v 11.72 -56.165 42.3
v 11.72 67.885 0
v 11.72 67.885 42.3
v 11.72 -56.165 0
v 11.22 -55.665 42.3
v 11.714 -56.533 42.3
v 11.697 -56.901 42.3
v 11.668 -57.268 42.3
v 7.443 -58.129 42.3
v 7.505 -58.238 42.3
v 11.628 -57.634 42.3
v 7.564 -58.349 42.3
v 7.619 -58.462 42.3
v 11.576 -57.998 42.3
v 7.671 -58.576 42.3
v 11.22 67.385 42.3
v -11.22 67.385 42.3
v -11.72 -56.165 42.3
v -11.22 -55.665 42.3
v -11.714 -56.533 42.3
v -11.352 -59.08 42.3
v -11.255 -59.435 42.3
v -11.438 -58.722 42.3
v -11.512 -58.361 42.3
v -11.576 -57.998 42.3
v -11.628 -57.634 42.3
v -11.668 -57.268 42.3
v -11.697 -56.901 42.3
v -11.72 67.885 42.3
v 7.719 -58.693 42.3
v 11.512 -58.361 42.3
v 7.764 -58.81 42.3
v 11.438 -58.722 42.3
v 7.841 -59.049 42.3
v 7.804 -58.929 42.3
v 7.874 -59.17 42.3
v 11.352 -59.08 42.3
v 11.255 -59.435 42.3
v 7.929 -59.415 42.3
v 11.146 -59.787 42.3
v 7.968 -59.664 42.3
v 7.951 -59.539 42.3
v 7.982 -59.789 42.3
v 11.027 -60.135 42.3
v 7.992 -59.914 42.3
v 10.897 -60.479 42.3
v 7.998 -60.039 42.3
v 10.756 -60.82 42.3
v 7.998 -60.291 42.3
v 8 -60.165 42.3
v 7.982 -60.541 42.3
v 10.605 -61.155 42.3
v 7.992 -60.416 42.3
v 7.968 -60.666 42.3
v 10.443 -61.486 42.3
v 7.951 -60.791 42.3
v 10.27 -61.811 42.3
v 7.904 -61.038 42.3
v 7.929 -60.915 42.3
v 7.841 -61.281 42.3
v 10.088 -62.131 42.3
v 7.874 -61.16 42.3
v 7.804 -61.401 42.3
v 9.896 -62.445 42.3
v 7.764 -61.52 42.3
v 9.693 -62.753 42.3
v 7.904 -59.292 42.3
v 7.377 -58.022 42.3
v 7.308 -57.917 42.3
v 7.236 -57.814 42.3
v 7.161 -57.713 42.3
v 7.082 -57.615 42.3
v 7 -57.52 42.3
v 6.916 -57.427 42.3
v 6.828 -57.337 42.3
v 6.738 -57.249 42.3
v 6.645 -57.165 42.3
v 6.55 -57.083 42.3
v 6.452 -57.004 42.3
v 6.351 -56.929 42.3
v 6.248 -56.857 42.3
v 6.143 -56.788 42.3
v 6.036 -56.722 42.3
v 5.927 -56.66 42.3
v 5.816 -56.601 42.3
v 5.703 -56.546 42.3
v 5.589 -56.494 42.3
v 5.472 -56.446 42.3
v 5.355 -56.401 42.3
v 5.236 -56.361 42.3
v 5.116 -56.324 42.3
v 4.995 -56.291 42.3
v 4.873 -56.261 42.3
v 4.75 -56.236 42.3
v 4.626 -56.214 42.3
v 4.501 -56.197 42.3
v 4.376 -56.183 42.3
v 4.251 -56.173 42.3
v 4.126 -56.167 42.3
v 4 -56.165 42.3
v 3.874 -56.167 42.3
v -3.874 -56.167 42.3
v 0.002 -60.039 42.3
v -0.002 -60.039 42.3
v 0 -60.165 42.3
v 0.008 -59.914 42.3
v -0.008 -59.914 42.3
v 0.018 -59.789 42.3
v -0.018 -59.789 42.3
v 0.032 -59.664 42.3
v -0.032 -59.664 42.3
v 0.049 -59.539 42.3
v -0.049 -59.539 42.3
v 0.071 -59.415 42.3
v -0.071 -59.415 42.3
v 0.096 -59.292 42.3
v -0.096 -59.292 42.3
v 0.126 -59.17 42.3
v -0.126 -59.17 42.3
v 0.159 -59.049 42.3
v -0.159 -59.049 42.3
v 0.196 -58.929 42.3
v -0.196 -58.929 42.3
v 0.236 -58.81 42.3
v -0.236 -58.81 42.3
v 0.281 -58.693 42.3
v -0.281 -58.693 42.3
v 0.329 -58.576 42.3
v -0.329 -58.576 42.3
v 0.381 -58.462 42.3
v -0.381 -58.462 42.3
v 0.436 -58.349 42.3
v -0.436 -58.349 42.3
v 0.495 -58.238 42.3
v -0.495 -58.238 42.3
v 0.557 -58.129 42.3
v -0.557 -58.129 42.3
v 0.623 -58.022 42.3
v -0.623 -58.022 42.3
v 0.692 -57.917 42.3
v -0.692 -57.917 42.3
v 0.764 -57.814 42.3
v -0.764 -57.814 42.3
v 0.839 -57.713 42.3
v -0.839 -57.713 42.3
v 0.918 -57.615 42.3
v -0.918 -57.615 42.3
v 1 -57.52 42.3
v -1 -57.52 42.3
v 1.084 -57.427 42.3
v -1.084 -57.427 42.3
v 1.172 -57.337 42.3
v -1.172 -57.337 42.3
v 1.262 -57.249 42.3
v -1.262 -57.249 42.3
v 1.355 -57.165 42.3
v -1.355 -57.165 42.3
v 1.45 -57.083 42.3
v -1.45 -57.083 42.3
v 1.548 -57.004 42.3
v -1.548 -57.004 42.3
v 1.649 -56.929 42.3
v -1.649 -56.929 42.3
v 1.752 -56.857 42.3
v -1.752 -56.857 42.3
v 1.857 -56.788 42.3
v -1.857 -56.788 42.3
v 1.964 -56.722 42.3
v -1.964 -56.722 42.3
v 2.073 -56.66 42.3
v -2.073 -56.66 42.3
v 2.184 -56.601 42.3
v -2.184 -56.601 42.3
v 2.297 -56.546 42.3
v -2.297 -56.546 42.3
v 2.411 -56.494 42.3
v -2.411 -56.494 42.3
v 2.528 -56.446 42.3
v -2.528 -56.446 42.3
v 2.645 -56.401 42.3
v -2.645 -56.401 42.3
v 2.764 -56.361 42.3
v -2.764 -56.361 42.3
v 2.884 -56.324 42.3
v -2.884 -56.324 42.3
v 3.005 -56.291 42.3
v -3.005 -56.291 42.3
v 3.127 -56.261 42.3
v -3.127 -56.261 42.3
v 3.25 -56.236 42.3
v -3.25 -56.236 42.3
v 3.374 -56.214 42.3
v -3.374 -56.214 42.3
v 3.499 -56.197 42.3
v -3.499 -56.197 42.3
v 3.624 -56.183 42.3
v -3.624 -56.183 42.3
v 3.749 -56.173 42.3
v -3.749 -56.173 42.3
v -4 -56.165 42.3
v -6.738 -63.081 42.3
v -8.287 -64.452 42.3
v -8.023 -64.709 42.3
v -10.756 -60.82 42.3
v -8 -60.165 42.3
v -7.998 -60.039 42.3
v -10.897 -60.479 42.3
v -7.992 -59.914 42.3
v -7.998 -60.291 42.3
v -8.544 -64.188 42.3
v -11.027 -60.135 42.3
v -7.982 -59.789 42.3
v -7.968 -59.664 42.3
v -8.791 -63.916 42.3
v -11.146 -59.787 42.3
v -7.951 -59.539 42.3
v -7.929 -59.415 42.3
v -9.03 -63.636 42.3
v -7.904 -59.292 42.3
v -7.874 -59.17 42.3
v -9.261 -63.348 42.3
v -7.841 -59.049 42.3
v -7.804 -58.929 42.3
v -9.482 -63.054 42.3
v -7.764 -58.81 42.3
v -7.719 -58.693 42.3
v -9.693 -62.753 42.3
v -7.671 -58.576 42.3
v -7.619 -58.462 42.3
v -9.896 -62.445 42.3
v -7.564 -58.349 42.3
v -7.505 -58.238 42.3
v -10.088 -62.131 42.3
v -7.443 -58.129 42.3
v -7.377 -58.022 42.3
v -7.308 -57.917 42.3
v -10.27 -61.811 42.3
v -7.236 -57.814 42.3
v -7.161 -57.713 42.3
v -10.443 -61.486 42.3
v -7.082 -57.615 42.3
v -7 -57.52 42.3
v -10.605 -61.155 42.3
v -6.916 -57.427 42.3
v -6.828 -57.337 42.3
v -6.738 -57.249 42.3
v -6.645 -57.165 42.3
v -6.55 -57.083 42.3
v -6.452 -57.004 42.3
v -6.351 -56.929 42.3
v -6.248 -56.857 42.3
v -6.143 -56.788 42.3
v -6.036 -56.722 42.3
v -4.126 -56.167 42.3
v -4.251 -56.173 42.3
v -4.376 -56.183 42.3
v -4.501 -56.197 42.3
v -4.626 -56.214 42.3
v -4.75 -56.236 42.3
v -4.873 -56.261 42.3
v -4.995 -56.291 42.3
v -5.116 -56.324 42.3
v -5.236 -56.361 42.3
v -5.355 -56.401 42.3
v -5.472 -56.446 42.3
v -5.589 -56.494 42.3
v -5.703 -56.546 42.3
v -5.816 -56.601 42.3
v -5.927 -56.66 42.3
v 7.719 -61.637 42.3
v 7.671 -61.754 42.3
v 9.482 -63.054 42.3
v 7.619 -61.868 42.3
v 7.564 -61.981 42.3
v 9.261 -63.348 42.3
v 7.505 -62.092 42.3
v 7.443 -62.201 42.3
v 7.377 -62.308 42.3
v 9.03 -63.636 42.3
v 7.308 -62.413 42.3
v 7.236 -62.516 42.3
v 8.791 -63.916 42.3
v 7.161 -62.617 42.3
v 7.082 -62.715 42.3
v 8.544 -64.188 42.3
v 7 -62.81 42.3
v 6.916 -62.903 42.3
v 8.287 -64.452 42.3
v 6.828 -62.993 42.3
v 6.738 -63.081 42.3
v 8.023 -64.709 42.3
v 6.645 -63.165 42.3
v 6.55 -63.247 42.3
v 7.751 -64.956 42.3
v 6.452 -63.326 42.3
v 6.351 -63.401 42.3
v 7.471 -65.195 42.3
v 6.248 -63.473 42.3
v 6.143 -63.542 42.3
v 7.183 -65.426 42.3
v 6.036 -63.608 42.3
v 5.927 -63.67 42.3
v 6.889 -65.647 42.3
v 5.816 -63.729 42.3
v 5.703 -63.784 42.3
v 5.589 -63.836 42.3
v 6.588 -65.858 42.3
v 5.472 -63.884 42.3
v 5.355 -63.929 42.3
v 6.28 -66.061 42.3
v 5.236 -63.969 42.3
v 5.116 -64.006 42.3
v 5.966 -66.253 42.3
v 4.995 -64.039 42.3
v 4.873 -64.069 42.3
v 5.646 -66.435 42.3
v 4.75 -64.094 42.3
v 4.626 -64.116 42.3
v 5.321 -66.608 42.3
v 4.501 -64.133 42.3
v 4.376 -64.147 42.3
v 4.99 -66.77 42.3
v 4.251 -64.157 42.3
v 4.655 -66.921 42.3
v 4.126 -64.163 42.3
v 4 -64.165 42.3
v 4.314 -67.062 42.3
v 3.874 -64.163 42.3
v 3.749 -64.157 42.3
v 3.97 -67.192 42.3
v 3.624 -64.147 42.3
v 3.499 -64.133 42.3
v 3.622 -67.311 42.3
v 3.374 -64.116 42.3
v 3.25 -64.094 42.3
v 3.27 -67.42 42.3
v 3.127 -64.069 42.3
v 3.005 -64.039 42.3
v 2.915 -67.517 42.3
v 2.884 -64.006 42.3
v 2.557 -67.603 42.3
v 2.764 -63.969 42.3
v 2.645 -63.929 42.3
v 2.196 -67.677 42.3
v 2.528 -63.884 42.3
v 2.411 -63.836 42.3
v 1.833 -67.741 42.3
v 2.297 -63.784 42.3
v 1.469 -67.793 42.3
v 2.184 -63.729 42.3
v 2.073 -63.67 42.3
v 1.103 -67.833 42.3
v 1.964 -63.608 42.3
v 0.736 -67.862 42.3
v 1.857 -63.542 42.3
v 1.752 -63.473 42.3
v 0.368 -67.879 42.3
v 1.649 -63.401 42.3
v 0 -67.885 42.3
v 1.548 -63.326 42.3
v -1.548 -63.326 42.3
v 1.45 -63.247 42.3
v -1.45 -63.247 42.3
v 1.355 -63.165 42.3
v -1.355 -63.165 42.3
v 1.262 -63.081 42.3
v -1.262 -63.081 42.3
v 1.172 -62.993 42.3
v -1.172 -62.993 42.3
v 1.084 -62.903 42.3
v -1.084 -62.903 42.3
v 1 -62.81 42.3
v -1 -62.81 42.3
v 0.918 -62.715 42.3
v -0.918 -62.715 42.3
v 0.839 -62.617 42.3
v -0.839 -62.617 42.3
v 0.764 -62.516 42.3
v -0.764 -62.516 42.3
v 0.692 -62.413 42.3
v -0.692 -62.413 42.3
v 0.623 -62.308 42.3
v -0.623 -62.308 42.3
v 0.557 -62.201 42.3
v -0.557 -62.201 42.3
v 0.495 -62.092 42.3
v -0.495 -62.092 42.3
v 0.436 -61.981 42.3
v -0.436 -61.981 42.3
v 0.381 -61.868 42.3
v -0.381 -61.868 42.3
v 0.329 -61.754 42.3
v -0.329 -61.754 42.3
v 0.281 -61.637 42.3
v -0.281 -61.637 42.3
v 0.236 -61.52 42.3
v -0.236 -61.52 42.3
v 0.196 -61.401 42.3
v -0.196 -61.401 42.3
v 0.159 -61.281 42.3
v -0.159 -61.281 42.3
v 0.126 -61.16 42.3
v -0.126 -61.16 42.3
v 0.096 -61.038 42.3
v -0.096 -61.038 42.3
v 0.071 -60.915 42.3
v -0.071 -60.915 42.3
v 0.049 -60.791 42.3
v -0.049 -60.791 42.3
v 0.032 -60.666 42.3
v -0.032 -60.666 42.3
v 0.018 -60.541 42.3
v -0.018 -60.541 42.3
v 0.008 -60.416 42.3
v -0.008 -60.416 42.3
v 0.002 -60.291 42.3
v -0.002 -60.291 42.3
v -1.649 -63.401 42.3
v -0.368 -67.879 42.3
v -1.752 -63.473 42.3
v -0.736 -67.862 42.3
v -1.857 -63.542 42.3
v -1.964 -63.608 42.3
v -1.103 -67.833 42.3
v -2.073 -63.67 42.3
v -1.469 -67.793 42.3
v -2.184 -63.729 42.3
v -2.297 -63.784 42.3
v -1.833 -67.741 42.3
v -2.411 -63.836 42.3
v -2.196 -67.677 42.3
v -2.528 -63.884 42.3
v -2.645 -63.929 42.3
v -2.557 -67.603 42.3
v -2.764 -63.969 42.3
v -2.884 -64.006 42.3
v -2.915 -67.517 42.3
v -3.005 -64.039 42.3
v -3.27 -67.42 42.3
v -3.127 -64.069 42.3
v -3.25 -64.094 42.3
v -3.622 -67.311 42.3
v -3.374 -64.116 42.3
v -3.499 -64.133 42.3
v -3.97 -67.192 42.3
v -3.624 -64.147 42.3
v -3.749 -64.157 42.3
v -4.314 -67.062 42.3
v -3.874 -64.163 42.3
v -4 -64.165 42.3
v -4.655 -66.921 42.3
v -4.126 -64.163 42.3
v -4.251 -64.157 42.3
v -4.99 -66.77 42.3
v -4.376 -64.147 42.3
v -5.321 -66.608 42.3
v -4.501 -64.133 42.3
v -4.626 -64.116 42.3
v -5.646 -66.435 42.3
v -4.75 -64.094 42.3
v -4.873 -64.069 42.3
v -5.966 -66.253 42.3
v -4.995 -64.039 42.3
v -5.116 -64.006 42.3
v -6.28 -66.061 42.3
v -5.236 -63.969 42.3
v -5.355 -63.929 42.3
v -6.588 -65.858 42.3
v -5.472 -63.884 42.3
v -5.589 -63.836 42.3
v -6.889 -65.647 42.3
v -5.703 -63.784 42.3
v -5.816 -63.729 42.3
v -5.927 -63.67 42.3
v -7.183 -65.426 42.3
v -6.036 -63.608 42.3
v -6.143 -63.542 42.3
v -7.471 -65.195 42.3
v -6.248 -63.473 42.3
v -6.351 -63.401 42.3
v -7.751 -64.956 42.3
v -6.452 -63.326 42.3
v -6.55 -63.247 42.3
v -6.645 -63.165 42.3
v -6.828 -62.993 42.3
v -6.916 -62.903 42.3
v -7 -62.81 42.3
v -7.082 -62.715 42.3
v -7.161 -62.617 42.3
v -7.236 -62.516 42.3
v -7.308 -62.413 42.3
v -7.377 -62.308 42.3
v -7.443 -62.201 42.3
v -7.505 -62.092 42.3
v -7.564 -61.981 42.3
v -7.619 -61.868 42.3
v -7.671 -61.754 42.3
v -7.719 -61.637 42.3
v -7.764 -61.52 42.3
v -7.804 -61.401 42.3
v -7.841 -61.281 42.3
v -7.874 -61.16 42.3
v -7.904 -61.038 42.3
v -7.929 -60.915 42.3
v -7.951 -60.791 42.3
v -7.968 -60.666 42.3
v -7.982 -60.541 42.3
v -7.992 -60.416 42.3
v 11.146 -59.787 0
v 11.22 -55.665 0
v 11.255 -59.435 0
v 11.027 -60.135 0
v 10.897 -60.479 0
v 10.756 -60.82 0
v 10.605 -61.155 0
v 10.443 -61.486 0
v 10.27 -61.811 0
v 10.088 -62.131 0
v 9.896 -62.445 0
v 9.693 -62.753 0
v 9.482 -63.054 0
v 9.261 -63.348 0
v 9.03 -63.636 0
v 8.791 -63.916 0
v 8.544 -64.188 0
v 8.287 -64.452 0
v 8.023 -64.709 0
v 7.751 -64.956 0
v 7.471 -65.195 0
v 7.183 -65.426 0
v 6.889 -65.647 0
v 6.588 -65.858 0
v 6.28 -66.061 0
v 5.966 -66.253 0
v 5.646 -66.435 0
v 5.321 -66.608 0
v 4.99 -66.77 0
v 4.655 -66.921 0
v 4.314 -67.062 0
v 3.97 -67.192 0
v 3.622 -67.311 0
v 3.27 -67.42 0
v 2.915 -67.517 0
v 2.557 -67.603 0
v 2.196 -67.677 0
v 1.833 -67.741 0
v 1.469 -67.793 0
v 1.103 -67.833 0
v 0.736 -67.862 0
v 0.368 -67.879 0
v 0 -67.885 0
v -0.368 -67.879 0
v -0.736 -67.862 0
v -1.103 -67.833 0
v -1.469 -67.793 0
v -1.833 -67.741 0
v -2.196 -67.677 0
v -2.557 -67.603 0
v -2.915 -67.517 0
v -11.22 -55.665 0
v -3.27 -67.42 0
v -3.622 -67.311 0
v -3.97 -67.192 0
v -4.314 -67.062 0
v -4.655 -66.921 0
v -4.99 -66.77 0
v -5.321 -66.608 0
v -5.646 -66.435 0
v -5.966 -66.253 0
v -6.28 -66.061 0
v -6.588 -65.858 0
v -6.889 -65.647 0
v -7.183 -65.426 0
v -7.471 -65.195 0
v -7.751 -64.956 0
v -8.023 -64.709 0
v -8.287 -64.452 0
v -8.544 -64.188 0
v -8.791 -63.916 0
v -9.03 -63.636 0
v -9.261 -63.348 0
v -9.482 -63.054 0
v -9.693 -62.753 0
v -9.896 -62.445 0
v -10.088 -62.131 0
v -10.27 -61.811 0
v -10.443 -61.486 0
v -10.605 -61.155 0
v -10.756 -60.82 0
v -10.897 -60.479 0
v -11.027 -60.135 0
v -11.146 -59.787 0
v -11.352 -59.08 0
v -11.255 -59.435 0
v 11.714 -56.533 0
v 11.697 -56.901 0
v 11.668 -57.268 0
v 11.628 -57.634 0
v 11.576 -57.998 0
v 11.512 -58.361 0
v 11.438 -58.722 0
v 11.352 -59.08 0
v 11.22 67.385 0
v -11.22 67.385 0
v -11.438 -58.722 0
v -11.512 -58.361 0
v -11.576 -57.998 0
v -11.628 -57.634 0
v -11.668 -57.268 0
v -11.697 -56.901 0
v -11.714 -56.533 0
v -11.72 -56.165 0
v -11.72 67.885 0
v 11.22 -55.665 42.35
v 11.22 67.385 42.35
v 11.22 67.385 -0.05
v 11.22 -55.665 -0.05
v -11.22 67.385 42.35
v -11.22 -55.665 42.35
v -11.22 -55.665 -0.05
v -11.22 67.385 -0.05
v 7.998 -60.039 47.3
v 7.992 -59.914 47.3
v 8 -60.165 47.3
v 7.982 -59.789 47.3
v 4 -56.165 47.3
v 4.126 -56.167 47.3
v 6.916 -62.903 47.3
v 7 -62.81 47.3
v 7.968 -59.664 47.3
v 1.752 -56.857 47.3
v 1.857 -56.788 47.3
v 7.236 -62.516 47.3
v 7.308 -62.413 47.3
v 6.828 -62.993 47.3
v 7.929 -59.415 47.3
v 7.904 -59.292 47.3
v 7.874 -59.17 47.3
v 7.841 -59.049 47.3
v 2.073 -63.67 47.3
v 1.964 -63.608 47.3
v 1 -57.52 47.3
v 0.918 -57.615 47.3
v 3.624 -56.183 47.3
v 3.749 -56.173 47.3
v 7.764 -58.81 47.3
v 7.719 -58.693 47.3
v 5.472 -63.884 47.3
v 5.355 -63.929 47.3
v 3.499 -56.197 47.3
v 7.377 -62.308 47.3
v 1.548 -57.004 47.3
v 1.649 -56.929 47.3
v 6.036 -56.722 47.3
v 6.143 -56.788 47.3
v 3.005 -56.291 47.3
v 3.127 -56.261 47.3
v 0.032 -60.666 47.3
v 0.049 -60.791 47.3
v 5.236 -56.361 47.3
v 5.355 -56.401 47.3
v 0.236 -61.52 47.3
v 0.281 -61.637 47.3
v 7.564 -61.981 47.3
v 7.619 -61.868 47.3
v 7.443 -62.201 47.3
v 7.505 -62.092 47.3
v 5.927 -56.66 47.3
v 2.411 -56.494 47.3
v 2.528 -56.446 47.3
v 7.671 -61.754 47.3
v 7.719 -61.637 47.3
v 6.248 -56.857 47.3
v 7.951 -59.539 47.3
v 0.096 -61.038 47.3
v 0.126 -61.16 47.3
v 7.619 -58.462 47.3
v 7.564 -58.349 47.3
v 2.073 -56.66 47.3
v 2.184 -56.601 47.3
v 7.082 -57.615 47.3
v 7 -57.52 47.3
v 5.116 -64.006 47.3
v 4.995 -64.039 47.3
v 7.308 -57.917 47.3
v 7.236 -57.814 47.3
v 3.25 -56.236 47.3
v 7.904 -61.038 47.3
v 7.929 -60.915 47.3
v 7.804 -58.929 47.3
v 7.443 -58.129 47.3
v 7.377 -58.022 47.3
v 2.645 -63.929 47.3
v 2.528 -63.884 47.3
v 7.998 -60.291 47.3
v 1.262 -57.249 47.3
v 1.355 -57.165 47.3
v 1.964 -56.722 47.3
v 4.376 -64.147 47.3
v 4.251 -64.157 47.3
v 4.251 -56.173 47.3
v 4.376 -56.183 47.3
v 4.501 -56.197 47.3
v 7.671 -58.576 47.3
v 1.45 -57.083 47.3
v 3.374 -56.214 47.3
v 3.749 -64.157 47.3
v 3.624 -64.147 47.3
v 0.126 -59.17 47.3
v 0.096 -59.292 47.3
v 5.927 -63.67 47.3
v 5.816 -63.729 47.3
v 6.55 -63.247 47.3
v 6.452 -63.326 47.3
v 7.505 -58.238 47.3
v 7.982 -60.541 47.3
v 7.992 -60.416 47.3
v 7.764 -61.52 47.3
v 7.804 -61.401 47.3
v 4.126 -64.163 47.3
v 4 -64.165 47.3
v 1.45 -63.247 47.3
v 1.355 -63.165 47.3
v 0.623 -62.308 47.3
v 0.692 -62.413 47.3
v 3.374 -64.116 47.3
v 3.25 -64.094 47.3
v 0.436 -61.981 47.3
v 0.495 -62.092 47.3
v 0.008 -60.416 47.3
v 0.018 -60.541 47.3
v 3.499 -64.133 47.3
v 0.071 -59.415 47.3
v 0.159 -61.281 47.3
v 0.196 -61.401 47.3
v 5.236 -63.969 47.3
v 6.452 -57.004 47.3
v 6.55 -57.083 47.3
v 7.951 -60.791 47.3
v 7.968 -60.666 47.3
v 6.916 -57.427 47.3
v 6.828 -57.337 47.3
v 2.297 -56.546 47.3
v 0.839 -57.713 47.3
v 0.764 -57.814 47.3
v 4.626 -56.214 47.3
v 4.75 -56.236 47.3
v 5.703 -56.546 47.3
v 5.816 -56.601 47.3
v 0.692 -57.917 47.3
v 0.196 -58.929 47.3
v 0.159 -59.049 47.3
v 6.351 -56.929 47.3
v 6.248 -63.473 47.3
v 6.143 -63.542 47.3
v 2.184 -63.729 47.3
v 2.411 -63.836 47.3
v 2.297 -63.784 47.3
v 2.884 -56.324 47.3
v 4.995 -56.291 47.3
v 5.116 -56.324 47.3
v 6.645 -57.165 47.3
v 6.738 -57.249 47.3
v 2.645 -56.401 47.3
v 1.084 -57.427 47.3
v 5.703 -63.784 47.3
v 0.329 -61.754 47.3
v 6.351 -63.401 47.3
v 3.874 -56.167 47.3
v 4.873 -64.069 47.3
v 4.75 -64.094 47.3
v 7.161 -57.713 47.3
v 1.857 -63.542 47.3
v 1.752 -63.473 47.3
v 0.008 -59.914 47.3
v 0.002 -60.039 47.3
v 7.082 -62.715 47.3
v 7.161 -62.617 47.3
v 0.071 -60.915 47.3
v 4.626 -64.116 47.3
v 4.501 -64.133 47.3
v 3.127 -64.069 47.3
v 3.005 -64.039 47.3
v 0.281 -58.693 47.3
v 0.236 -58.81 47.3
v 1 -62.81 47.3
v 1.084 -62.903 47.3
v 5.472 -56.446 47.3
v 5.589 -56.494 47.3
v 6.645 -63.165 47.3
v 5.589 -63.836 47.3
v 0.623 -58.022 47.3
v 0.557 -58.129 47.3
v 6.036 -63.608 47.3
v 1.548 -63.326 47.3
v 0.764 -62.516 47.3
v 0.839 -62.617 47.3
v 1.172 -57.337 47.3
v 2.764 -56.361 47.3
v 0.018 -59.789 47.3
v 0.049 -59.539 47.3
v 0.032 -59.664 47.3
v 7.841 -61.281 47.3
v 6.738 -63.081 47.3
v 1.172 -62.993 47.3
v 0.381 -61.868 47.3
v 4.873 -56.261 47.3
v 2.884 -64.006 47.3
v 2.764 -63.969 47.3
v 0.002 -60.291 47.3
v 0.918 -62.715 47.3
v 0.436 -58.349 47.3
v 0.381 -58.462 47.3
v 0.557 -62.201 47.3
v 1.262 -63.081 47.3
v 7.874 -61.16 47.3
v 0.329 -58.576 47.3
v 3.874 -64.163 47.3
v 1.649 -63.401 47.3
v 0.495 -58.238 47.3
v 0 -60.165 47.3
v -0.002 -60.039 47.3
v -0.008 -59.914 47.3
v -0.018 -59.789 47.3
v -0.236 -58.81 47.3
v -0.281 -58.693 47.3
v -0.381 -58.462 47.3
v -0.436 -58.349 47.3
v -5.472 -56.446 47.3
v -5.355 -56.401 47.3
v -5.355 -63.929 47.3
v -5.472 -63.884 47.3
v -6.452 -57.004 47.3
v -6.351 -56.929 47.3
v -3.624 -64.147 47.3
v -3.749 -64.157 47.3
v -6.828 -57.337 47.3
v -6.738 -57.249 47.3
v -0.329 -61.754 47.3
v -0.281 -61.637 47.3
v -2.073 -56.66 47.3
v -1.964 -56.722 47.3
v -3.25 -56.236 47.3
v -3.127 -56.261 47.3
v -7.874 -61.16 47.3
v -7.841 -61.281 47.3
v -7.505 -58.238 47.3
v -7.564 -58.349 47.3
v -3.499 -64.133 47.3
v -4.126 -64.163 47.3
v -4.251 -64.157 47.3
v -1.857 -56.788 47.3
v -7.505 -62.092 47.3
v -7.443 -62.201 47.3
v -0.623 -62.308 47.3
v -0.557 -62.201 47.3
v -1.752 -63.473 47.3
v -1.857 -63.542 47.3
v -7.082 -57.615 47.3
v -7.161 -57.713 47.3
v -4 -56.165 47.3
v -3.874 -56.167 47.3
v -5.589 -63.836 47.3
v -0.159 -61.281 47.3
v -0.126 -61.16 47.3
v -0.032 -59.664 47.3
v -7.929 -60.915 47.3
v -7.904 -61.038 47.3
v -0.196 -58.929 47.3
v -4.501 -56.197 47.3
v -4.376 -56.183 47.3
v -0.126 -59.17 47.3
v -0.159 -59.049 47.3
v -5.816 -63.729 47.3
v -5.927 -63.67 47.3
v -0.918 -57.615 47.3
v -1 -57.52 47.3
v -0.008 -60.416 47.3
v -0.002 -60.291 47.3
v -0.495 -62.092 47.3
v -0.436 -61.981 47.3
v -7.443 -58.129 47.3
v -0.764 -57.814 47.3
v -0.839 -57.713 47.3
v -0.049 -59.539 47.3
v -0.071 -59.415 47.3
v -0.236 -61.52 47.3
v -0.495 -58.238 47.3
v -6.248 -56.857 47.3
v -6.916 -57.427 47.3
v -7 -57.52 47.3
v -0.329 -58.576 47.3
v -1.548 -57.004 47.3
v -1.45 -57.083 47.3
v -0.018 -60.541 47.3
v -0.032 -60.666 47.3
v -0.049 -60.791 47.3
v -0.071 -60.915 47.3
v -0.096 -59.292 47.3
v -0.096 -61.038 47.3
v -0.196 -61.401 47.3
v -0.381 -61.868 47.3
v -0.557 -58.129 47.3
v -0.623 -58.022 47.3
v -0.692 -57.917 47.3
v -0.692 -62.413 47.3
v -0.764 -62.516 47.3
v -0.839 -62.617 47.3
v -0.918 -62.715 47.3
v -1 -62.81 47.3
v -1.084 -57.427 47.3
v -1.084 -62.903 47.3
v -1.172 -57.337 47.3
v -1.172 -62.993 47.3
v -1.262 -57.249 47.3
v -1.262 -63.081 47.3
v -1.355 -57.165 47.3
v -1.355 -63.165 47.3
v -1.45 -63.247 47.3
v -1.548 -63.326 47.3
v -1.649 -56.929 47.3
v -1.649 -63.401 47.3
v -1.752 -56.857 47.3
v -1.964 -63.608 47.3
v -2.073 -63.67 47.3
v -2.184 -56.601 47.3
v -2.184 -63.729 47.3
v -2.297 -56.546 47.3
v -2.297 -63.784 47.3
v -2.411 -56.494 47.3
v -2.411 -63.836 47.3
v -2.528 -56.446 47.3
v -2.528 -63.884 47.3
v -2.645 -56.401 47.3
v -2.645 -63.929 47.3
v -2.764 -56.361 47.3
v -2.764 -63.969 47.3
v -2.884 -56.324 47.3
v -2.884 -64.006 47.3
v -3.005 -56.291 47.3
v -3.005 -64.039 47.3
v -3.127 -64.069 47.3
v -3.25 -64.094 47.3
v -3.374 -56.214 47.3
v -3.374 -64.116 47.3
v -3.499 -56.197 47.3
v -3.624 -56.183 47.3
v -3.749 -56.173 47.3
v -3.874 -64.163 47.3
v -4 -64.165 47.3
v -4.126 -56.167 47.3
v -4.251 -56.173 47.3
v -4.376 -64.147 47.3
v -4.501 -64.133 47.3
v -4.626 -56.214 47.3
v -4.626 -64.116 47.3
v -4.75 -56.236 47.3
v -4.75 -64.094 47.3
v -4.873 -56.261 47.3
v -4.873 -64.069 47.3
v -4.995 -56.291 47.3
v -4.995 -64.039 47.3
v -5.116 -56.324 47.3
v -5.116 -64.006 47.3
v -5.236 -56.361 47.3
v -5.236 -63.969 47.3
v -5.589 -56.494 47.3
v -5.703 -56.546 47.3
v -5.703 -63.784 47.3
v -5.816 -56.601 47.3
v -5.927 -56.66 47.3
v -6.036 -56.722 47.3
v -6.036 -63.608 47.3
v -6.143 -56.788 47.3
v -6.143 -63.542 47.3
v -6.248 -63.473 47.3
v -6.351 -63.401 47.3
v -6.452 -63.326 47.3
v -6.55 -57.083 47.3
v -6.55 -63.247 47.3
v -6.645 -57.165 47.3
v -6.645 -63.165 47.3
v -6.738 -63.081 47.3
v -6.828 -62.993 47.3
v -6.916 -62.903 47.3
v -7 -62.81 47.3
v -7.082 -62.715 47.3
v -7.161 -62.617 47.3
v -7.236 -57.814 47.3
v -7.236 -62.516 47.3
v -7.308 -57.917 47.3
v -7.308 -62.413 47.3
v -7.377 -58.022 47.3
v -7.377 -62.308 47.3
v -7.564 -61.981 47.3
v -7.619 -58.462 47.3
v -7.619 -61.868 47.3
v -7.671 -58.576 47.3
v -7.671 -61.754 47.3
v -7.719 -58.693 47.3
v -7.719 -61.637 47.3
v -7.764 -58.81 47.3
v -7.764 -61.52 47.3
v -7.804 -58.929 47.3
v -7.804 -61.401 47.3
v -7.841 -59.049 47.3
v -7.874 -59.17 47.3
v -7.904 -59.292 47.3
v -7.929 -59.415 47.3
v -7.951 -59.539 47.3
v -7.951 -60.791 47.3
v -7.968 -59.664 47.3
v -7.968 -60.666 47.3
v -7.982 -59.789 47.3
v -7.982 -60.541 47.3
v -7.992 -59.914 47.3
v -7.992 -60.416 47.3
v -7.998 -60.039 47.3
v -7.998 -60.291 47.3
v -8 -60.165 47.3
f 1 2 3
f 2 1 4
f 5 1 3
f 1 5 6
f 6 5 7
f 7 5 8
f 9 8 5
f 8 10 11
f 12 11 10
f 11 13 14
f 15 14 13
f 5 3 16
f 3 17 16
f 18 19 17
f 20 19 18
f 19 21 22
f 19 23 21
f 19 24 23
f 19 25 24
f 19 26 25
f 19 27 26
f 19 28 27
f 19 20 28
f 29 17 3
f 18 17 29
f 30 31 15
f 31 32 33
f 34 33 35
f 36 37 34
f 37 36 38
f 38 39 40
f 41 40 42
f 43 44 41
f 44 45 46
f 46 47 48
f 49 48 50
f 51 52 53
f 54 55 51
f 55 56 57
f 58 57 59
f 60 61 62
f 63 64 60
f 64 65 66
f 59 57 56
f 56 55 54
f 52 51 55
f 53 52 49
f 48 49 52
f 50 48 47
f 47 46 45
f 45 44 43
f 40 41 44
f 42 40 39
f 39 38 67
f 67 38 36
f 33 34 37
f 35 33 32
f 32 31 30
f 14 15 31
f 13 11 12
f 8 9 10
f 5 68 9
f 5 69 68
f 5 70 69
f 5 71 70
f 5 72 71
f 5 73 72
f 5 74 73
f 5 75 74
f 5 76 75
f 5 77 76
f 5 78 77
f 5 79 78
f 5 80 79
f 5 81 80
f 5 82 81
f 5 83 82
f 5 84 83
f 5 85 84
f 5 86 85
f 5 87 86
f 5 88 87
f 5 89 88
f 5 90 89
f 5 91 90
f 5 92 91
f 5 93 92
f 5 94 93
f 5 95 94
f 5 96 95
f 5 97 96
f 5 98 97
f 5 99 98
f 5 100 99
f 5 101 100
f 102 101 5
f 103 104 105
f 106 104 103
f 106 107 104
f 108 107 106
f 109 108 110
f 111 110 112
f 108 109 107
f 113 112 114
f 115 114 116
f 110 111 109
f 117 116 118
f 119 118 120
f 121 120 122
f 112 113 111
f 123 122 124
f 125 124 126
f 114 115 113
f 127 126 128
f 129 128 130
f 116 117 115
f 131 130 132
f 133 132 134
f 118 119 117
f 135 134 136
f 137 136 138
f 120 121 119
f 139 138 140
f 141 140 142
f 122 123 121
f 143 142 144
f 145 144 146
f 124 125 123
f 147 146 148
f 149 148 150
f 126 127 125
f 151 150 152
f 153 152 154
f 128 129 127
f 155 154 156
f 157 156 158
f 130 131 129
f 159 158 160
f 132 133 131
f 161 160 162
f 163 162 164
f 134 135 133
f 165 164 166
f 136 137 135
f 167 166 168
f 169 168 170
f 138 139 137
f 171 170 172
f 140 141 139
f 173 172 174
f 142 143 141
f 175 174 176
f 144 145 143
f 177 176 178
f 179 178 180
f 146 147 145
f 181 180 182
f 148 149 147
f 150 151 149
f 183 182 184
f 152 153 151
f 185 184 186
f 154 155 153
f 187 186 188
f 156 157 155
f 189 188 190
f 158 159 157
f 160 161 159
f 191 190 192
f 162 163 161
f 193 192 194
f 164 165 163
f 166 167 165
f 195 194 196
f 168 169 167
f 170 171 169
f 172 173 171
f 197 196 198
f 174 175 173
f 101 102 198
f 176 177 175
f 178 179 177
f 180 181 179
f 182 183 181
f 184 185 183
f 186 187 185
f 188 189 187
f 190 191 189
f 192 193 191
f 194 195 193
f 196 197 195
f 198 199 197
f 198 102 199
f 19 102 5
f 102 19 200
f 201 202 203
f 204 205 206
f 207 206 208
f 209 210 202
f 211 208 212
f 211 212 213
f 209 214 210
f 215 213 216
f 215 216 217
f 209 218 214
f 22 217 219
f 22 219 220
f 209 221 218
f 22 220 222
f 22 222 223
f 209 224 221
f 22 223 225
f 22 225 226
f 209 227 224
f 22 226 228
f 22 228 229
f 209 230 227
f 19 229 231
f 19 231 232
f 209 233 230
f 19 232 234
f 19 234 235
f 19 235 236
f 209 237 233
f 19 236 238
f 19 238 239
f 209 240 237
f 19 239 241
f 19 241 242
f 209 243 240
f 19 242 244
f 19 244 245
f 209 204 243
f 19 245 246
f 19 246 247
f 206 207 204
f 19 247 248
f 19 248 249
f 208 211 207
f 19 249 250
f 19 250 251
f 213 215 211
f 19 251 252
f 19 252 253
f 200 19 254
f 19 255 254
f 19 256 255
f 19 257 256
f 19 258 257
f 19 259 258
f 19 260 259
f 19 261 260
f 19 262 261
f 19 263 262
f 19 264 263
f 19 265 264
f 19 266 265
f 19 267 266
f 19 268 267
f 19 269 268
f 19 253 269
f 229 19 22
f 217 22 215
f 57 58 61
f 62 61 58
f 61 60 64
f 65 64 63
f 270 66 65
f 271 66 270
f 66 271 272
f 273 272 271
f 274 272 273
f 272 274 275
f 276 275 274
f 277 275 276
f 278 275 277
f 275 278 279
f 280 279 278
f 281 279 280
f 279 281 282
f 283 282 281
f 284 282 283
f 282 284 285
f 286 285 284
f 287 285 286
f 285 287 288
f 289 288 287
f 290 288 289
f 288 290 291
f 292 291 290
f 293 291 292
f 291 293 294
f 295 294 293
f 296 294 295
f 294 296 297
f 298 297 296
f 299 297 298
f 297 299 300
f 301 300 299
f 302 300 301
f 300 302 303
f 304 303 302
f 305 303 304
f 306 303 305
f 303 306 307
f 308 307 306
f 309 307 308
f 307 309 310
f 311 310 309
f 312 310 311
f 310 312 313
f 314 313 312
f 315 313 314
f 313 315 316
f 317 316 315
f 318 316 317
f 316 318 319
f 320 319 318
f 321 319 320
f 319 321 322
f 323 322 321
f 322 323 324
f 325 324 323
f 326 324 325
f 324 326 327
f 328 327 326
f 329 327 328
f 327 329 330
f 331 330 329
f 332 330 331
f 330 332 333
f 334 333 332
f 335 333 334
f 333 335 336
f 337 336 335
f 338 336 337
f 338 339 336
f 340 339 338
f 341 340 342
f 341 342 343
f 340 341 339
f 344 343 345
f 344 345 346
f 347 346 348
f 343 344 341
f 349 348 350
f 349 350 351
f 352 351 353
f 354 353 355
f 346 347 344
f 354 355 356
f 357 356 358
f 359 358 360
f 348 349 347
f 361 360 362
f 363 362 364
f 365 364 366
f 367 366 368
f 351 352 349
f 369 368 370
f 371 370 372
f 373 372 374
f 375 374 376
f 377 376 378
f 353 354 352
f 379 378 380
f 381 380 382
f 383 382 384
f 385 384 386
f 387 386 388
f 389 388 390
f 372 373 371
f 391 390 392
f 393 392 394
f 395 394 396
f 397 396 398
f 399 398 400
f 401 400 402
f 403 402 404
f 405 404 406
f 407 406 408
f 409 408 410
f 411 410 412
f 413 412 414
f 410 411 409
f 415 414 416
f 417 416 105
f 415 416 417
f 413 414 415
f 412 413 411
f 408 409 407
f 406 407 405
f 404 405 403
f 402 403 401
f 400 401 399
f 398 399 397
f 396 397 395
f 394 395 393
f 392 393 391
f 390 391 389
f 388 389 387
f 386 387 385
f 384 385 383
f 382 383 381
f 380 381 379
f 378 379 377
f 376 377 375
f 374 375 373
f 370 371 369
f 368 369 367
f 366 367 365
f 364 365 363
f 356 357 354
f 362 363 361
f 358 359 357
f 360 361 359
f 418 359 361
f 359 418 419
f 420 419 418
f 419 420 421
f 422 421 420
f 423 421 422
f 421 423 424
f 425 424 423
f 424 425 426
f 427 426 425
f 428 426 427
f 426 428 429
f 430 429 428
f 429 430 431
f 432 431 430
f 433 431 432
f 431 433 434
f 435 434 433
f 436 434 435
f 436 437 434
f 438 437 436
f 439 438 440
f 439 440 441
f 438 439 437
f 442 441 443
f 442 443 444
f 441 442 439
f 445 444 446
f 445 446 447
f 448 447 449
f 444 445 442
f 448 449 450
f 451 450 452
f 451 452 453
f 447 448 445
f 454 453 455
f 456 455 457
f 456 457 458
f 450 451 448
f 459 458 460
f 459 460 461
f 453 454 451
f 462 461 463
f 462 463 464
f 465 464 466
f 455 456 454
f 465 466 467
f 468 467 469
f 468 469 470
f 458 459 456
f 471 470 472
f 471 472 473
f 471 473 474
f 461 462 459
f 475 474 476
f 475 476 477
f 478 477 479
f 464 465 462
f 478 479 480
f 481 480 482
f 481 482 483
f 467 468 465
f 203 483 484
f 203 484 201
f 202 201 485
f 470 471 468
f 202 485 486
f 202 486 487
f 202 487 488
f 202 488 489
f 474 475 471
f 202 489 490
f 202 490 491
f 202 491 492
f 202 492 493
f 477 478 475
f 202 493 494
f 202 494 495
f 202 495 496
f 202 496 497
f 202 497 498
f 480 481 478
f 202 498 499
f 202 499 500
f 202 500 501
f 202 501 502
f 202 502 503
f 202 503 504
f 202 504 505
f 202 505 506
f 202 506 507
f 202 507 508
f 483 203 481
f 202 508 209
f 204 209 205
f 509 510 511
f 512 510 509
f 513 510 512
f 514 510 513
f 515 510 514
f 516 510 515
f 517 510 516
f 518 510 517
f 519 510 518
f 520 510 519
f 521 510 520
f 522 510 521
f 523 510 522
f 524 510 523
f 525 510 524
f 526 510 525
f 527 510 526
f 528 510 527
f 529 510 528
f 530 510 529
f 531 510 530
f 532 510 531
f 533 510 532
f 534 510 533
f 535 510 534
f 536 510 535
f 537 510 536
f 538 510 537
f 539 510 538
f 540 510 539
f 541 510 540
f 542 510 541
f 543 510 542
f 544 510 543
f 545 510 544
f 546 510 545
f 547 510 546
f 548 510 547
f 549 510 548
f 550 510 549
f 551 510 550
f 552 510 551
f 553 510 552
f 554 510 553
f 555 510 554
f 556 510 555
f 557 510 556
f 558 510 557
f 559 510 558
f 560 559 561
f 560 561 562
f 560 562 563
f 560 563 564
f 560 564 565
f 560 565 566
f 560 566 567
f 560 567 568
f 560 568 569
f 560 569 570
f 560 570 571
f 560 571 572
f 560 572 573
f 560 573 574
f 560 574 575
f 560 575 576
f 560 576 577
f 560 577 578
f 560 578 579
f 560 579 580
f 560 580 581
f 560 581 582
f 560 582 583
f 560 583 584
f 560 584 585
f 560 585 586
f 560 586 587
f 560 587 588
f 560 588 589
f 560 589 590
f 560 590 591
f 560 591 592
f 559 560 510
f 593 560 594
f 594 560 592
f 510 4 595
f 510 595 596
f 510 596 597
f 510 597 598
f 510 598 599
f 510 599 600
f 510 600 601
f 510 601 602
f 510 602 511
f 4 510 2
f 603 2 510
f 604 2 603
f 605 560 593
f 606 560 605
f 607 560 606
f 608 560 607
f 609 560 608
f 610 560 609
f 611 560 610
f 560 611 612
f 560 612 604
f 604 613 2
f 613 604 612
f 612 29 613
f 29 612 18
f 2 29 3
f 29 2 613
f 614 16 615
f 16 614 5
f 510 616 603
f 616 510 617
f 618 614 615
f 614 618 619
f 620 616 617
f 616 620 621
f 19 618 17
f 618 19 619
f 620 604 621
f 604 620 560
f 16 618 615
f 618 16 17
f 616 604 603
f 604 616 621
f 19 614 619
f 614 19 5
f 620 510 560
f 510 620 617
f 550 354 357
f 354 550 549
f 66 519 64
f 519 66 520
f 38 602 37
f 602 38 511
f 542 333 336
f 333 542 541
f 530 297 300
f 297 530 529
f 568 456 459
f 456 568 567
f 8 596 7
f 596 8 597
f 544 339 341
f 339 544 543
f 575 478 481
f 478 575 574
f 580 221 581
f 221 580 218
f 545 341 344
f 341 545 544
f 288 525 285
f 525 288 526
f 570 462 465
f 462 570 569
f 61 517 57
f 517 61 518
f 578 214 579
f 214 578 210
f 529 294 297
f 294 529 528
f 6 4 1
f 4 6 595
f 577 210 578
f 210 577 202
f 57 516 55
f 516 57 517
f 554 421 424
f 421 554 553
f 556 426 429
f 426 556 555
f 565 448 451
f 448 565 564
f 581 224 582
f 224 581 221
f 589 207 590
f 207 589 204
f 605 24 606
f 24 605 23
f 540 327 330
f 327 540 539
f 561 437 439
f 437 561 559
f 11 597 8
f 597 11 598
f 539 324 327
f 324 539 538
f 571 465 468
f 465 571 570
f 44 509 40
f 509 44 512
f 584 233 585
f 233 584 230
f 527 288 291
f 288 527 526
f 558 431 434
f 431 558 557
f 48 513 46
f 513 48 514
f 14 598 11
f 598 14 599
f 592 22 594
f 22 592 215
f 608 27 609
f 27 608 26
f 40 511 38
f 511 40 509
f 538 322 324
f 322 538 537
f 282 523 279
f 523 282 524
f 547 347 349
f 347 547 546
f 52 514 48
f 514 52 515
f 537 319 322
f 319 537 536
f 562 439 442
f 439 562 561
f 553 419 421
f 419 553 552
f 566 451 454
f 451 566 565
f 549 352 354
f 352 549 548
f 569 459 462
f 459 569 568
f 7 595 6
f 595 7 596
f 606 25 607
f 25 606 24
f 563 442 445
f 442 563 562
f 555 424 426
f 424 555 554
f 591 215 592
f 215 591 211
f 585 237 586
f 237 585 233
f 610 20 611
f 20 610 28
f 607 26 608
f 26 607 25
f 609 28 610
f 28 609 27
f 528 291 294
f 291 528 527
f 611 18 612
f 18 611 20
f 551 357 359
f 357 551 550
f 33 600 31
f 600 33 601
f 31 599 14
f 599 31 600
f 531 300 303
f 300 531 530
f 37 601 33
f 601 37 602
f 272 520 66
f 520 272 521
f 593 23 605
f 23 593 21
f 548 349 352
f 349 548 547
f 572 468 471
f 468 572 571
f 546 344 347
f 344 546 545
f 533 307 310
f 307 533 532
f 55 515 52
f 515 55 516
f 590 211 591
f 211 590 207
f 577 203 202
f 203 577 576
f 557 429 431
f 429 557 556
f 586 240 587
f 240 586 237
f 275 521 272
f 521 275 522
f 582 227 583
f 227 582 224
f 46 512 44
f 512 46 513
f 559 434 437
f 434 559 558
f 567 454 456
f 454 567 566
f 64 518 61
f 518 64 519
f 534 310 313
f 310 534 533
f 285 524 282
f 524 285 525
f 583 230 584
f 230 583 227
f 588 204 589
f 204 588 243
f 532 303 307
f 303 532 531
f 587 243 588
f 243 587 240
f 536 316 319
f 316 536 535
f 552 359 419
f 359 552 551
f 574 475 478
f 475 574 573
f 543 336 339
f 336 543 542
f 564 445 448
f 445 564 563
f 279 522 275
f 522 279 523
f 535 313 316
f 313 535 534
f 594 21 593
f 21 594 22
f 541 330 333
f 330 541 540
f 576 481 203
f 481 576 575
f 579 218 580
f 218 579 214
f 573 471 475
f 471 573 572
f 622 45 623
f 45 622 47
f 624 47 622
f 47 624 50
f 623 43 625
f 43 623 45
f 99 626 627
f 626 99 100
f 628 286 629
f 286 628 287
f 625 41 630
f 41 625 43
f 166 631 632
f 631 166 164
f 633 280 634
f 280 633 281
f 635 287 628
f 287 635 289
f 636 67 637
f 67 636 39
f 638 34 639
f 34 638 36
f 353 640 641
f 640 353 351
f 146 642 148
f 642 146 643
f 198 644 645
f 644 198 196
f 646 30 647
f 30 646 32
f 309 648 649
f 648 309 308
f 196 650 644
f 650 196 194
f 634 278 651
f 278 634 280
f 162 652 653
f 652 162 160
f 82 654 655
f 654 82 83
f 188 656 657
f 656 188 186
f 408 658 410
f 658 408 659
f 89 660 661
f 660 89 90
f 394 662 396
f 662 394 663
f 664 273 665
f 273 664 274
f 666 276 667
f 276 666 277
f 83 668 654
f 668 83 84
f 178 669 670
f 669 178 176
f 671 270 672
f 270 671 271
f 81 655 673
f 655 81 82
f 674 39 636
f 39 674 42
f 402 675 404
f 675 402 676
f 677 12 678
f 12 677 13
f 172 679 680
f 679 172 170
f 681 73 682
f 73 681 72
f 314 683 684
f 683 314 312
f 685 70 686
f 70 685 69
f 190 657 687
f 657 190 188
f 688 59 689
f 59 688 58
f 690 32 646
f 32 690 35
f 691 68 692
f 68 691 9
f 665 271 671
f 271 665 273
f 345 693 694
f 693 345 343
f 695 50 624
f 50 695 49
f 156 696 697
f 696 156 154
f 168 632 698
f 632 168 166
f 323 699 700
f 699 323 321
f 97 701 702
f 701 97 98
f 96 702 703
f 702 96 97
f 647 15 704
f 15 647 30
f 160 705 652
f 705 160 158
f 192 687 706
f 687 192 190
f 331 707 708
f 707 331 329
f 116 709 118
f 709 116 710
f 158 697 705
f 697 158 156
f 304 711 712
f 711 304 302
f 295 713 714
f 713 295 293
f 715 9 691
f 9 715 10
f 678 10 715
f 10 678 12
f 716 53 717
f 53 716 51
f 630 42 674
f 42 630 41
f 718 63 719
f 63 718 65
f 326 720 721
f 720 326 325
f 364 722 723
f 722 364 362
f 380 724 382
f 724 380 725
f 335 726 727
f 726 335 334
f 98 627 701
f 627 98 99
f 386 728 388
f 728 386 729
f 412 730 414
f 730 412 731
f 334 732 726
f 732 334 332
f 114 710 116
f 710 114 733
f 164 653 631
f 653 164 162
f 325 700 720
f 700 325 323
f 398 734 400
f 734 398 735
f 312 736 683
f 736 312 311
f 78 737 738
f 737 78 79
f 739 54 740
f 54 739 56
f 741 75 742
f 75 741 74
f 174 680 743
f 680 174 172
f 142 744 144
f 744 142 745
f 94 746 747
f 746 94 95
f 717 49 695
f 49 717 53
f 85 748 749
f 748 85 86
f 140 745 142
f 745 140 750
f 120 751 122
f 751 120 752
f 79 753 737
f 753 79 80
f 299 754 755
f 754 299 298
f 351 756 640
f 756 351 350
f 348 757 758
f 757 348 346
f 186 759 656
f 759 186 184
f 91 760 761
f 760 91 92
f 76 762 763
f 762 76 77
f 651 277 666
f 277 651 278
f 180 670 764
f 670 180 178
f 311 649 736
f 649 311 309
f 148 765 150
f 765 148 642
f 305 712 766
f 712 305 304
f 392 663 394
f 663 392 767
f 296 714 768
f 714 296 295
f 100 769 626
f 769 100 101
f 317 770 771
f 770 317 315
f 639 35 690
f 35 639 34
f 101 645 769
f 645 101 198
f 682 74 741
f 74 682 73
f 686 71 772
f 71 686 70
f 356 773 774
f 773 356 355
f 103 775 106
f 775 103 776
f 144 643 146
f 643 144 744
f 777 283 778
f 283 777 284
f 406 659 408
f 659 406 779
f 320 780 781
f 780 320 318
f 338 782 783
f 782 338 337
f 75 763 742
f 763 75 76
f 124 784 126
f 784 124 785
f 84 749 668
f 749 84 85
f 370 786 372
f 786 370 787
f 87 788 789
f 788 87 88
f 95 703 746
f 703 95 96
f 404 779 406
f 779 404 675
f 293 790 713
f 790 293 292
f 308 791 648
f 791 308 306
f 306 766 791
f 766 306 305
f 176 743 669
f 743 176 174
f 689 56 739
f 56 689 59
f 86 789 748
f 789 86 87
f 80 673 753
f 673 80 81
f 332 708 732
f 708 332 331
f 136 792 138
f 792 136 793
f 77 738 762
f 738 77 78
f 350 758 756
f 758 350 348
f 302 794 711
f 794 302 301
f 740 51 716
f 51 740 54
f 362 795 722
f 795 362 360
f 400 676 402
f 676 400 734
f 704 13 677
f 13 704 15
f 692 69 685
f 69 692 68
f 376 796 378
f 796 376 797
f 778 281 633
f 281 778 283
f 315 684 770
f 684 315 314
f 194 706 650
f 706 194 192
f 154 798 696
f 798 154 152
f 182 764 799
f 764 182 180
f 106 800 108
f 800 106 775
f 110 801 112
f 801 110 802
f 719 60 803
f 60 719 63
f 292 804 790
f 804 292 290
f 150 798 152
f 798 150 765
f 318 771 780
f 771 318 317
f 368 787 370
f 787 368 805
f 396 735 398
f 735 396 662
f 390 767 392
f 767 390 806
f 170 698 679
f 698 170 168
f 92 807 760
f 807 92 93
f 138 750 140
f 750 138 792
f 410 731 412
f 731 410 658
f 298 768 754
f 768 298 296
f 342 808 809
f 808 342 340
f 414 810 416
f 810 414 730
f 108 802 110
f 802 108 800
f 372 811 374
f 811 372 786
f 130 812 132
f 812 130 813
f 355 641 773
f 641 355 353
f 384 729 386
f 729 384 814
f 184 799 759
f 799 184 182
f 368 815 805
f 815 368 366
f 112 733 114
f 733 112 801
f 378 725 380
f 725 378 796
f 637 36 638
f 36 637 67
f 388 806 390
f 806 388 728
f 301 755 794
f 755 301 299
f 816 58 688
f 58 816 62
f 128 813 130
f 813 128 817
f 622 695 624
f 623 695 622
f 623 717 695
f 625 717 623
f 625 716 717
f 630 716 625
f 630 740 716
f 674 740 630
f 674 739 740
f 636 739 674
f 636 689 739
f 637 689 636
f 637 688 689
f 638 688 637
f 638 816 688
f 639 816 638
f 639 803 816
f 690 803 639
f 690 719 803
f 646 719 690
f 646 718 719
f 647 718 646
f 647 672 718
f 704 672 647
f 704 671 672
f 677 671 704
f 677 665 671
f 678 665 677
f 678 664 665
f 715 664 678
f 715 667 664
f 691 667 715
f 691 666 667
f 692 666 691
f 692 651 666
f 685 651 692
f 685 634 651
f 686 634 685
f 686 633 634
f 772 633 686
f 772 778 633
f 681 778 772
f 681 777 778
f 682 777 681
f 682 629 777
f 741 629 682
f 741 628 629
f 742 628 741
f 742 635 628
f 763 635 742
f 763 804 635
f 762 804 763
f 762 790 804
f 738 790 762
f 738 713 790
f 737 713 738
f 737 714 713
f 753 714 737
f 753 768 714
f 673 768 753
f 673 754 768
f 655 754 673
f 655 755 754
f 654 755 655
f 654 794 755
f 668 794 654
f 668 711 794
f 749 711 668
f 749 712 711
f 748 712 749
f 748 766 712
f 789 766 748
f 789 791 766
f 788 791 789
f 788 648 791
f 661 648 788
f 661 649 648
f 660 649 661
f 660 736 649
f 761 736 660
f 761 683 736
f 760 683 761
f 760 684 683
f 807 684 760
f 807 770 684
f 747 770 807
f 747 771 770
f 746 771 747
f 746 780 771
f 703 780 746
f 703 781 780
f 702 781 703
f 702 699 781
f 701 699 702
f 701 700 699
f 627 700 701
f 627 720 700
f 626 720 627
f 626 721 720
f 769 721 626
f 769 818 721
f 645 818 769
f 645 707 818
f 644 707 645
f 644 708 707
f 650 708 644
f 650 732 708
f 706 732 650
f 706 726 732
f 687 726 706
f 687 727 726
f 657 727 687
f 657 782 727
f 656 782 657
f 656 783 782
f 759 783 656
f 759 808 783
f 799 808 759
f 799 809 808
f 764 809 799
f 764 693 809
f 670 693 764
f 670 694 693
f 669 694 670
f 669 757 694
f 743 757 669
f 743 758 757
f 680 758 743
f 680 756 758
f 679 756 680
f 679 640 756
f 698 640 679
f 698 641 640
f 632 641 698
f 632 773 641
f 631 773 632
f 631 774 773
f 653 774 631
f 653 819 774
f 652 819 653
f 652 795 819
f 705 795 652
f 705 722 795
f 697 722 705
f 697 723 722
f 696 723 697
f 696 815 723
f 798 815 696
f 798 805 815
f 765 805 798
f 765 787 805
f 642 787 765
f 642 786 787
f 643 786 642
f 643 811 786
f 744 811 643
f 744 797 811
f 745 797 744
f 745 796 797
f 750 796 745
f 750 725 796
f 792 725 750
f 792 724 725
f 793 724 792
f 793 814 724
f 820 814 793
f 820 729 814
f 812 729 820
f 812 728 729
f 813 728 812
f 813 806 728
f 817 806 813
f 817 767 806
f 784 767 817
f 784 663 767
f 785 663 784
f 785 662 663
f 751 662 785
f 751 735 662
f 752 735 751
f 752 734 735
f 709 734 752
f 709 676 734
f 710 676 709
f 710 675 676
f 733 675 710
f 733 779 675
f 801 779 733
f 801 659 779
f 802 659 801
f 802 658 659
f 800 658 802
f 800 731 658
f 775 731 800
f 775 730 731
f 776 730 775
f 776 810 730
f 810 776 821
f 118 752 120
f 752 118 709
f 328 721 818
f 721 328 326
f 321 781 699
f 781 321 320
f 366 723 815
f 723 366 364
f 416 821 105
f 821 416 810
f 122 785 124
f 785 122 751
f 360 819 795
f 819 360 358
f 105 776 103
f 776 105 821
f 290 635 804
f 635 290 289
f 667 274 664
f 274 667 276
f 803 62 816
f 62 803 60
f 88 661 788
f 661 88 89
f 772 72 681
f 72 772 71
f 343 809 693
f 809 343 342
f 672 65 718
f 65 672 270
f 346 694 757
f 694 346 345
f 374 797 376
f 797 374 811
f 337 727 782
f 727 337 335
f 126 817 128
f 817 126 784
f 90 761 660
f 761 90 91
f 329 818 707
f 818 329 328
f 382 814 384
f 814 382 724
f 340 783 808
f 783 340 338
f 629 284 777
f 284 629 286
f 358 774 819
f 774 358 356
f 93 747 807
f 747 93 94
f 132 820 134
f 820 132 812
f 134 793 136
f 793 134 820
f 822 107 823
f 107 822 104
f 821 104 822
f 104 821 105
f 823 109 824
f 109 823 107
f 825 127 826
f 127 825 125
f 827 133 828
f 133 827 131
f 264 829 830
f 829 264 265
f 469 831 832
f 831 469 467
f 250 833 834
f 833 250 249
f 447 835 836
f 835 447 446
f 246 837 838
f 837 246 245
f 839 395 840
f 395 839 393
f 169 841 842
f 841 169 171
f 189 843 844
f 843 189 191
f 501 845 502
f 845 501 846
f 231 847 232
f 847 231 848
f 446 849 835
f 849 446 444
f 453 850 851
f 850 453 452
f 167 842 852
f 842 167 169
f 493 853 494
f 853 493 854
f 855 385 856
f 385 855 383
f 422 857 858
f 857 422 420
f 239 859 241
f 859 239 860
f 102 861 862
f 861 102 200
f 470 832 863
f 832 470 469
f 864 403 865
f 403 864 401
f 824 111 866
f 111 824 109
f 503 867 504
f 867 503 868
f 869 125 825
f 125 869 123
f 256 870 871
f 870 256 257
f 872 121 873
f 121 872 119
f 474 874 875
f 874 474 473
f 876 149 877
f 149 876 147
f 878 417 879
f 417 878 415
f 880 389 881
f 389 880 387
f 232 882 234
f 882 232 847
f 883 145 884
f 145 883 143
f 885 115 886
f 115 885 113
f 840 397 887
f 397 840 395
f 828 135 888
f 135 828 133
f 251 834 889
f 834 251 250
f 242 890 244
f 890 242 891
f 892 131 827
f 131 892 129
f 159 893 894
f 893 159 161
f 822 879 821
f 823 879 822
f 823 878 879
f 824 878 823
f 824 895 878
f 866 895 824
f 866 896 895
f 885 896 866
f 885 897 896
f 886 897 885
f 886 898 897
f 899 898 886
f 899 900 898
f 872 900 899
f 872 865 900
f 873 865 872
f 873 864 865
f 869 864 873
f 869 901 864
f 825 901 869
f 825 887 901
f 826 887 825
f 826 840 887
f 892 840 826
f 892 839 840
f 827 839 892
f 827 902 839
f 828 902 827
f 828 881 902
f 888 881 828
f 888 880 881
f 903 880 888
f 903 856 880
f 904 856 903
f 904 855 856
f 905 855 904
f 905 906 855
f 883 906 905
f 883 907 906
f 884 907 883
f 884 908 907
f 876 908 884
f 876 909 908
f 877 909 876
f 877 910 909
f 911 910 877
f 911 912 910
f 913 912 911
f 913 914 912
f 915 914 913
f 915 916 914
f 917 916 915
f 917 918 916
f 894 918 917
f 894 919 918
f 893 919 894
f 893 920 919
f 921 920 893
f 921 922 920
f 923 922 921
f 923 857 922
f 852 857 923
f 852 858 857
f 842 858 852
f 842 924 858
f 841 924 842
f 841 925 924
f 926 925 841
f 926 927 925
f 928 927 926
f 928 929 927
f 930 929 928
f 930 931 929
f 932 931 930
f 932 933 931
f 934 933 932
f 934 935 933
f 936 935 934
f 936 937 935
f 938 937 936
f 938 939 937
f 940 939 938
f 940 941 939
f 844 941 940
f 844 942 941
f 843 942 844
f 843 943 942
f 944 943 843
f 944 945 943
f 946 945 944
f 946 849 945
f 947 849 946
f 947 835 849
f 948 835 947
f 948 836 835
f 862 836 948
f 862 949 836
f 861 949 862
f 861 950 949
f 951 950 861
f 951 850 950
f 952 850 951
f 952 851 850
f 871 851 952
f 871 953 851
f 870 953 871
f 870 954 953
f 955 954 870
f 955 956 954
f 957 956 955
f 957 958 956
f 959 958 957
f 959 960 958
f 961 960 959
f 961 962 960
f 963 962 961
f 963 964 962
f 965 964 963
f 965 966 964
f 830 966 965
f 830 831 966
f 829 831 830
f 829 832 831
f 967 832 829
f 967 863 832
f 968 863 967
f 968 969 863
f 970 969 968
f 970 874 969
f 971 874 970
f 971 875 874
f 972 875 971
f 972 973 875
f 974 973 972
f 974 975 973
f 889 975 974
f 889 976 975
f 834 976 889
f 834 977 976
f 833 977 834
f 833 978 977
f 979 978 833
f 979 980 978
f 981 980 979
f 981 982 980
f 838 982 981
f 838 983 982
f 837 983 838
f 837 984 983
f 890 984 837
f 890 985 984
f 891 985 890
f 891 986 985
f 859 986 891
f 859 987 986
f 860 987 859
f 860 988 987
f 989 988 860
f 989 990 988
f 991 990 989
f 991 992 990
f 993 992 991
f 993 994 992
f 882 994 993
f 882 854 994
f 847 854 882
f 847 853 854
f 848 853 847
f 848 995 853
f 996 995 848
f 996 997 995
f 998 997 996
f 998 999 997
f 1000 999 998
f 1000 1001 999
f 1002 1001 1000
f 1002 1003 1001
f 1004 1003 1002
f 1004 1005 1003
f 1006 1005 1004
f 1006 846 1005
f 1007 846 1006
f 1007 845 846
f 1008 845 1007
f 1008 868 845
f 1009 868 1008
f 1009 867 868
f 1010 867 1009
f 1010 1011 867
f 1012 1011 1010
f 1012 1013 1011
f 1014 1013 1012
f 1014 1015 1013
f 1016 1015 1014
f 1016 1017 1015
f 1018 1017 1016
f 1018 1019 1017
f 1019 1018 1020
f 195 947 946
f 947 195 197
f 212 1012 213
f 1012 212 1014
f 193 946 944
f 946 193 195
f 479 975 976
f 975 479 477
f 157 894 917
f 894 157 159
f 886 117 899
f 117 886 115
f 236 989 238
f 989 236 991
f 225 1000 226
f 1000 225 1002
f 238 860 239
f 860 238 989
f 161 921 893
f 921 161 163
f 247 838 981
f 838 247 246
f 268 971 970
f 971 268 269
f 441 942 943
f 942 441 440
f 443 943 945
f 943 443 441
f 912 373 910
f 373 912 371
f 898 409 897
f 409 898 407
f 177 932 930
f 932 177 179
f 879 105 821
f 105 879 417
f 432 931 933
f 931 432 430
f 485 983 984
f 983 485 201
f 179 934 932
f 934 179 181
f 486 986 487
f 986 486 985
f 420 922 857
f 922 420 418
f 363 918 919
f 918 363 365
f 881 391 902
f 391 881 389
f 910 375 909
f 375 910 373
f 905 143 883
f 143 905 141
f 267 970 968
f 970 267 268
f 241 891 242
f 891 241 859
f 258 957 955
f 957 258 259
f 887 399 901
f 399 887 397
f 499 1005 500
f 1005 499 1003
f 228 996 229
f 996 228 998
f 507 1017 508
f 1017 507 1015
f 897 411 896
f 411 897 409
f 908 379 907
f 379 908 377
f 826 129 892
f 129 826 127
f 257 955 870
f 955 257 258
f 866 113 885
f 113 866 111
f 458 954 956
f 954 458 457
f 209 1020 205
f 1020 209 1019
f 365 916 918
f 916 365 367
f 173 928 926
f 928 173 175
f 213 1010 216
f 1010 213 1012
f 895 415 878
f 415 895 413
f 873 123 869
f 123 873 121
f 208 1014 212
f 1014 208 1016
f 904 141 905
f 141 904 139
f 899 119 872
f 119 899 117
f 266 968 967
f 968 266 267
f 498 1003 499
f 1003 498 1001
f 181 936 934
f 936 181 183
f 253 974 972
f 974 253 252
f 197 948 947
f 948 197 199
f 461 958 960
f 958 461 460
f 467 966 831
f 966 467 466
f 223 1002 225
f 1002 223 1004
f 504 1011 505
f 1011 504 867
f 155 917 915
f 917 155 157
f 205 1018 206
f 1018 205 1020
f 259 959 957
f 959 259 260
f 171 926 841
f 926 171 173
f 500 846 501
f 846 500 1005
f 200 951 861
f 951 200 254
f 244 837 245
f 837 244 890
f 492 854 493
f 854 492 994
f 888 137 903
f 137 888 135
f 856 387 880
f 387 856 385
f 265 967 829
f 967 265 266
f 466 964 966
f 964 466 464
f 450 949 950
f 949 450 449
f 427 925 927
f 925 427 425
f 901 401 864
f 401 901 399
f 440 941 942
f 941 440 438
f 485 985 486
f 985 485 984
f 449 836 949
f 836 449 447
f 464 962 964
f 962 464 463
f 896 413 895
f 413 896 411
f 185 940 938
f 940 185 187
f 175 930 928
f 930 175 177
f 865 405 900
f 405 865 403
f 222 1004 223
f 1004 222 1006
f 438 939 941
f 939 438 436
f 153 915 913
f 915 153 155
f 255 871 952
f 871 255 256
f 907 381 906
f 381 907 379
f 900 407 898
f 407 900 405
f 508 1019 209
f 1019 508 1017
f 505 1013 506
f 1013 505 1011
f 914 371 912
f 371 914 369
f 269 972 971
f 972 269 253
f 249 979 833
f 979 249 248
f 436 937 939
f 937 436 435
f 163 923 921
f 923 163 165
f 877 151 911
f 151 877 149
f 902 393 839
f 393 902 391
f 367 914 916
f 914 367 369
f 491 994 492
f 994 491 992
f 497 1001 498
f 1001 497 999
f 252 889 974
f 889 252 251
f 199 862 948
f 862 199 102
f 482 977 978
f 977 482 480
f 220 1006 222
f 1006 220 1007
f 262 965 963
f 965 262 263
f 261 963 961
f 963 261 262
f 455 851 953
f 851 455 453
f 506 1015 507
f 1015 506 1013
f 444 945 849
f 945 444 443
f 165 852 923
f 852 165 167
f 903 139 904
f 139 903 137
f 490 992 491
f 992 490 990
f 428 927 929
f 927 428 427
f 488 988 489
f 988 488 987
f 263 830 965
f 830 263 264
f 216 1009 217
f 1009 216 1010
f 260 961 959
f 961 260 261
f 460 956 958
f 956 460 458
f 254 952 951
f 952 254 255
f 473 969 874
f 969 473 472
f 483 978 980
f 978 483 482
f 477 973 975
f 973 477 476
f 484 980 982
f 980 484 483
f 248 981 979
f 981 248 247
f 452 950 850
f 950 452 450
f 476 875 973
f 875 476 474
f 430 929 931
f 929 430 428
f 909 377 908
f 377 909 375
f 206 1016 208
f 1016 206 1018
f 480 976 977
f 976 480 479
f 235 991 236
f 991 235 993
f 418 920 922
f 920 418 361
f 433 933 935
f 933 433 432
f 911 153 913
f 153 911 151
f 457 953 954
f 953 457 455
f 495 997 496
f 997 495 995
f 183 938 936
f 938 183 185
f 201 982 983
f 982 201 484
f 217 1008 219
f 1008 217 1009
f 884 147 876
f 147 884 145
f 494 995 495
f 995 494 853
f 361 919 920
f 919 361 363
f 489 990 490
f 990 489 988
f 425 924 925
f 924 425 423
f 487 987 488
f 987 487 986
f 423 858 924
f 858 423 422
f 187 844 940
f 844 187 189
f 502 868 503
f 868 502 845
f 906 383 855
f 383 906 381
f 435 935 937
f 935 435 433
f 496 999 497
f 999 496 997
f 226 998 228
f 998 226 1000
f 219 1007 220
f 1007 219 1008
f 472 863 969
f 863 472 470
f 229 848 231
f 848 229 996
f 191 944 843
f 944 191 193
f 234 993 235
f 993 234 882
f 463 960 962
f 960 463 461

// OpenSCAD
$fn = 200;


module universal_batery(a, b, c){
	translate ([0, a/2-b/2, 0]) {
		color ([0.004, 0.298, 0.745, 1]) cylinder (h = c, d = a);
		color ([0.9, 0.1, 0.1, 1]) translate ([4, -4, c]) cylinder(h = 5, d = 8);
		color ([0.1, 0.1, 0.1, 1]) translate ([-4, -4, c]) cylinder(h = 5, d = 8);
		translate ([-a/2, 0, 0]){
			color ([0.004, 0.298, 0.745, 1]) cube ([a, b-a/2, c]);
			color([0.8, 0.8, 0.8, 1]) translate ([0.5, 0.5, -0.05]) cube ([a-1, b-a/2-1, c+0.1]);
		}
	}
}

module battery(voltage, capacity){
	if(voltage == 11.1 && capacity == 3300){
		universal_batery(23.44, 135.77, 42.30);
	} else if(voltage == 11.1 && capacity == 4000){
		universal_batery(28.11, 135.77, 42.30);
	} else if(voltage == 11.1 && capacity == 1100){
		universal_batery(15, 100, 39);//needs to be measured
	}
}

battery(11.1, 3300);
